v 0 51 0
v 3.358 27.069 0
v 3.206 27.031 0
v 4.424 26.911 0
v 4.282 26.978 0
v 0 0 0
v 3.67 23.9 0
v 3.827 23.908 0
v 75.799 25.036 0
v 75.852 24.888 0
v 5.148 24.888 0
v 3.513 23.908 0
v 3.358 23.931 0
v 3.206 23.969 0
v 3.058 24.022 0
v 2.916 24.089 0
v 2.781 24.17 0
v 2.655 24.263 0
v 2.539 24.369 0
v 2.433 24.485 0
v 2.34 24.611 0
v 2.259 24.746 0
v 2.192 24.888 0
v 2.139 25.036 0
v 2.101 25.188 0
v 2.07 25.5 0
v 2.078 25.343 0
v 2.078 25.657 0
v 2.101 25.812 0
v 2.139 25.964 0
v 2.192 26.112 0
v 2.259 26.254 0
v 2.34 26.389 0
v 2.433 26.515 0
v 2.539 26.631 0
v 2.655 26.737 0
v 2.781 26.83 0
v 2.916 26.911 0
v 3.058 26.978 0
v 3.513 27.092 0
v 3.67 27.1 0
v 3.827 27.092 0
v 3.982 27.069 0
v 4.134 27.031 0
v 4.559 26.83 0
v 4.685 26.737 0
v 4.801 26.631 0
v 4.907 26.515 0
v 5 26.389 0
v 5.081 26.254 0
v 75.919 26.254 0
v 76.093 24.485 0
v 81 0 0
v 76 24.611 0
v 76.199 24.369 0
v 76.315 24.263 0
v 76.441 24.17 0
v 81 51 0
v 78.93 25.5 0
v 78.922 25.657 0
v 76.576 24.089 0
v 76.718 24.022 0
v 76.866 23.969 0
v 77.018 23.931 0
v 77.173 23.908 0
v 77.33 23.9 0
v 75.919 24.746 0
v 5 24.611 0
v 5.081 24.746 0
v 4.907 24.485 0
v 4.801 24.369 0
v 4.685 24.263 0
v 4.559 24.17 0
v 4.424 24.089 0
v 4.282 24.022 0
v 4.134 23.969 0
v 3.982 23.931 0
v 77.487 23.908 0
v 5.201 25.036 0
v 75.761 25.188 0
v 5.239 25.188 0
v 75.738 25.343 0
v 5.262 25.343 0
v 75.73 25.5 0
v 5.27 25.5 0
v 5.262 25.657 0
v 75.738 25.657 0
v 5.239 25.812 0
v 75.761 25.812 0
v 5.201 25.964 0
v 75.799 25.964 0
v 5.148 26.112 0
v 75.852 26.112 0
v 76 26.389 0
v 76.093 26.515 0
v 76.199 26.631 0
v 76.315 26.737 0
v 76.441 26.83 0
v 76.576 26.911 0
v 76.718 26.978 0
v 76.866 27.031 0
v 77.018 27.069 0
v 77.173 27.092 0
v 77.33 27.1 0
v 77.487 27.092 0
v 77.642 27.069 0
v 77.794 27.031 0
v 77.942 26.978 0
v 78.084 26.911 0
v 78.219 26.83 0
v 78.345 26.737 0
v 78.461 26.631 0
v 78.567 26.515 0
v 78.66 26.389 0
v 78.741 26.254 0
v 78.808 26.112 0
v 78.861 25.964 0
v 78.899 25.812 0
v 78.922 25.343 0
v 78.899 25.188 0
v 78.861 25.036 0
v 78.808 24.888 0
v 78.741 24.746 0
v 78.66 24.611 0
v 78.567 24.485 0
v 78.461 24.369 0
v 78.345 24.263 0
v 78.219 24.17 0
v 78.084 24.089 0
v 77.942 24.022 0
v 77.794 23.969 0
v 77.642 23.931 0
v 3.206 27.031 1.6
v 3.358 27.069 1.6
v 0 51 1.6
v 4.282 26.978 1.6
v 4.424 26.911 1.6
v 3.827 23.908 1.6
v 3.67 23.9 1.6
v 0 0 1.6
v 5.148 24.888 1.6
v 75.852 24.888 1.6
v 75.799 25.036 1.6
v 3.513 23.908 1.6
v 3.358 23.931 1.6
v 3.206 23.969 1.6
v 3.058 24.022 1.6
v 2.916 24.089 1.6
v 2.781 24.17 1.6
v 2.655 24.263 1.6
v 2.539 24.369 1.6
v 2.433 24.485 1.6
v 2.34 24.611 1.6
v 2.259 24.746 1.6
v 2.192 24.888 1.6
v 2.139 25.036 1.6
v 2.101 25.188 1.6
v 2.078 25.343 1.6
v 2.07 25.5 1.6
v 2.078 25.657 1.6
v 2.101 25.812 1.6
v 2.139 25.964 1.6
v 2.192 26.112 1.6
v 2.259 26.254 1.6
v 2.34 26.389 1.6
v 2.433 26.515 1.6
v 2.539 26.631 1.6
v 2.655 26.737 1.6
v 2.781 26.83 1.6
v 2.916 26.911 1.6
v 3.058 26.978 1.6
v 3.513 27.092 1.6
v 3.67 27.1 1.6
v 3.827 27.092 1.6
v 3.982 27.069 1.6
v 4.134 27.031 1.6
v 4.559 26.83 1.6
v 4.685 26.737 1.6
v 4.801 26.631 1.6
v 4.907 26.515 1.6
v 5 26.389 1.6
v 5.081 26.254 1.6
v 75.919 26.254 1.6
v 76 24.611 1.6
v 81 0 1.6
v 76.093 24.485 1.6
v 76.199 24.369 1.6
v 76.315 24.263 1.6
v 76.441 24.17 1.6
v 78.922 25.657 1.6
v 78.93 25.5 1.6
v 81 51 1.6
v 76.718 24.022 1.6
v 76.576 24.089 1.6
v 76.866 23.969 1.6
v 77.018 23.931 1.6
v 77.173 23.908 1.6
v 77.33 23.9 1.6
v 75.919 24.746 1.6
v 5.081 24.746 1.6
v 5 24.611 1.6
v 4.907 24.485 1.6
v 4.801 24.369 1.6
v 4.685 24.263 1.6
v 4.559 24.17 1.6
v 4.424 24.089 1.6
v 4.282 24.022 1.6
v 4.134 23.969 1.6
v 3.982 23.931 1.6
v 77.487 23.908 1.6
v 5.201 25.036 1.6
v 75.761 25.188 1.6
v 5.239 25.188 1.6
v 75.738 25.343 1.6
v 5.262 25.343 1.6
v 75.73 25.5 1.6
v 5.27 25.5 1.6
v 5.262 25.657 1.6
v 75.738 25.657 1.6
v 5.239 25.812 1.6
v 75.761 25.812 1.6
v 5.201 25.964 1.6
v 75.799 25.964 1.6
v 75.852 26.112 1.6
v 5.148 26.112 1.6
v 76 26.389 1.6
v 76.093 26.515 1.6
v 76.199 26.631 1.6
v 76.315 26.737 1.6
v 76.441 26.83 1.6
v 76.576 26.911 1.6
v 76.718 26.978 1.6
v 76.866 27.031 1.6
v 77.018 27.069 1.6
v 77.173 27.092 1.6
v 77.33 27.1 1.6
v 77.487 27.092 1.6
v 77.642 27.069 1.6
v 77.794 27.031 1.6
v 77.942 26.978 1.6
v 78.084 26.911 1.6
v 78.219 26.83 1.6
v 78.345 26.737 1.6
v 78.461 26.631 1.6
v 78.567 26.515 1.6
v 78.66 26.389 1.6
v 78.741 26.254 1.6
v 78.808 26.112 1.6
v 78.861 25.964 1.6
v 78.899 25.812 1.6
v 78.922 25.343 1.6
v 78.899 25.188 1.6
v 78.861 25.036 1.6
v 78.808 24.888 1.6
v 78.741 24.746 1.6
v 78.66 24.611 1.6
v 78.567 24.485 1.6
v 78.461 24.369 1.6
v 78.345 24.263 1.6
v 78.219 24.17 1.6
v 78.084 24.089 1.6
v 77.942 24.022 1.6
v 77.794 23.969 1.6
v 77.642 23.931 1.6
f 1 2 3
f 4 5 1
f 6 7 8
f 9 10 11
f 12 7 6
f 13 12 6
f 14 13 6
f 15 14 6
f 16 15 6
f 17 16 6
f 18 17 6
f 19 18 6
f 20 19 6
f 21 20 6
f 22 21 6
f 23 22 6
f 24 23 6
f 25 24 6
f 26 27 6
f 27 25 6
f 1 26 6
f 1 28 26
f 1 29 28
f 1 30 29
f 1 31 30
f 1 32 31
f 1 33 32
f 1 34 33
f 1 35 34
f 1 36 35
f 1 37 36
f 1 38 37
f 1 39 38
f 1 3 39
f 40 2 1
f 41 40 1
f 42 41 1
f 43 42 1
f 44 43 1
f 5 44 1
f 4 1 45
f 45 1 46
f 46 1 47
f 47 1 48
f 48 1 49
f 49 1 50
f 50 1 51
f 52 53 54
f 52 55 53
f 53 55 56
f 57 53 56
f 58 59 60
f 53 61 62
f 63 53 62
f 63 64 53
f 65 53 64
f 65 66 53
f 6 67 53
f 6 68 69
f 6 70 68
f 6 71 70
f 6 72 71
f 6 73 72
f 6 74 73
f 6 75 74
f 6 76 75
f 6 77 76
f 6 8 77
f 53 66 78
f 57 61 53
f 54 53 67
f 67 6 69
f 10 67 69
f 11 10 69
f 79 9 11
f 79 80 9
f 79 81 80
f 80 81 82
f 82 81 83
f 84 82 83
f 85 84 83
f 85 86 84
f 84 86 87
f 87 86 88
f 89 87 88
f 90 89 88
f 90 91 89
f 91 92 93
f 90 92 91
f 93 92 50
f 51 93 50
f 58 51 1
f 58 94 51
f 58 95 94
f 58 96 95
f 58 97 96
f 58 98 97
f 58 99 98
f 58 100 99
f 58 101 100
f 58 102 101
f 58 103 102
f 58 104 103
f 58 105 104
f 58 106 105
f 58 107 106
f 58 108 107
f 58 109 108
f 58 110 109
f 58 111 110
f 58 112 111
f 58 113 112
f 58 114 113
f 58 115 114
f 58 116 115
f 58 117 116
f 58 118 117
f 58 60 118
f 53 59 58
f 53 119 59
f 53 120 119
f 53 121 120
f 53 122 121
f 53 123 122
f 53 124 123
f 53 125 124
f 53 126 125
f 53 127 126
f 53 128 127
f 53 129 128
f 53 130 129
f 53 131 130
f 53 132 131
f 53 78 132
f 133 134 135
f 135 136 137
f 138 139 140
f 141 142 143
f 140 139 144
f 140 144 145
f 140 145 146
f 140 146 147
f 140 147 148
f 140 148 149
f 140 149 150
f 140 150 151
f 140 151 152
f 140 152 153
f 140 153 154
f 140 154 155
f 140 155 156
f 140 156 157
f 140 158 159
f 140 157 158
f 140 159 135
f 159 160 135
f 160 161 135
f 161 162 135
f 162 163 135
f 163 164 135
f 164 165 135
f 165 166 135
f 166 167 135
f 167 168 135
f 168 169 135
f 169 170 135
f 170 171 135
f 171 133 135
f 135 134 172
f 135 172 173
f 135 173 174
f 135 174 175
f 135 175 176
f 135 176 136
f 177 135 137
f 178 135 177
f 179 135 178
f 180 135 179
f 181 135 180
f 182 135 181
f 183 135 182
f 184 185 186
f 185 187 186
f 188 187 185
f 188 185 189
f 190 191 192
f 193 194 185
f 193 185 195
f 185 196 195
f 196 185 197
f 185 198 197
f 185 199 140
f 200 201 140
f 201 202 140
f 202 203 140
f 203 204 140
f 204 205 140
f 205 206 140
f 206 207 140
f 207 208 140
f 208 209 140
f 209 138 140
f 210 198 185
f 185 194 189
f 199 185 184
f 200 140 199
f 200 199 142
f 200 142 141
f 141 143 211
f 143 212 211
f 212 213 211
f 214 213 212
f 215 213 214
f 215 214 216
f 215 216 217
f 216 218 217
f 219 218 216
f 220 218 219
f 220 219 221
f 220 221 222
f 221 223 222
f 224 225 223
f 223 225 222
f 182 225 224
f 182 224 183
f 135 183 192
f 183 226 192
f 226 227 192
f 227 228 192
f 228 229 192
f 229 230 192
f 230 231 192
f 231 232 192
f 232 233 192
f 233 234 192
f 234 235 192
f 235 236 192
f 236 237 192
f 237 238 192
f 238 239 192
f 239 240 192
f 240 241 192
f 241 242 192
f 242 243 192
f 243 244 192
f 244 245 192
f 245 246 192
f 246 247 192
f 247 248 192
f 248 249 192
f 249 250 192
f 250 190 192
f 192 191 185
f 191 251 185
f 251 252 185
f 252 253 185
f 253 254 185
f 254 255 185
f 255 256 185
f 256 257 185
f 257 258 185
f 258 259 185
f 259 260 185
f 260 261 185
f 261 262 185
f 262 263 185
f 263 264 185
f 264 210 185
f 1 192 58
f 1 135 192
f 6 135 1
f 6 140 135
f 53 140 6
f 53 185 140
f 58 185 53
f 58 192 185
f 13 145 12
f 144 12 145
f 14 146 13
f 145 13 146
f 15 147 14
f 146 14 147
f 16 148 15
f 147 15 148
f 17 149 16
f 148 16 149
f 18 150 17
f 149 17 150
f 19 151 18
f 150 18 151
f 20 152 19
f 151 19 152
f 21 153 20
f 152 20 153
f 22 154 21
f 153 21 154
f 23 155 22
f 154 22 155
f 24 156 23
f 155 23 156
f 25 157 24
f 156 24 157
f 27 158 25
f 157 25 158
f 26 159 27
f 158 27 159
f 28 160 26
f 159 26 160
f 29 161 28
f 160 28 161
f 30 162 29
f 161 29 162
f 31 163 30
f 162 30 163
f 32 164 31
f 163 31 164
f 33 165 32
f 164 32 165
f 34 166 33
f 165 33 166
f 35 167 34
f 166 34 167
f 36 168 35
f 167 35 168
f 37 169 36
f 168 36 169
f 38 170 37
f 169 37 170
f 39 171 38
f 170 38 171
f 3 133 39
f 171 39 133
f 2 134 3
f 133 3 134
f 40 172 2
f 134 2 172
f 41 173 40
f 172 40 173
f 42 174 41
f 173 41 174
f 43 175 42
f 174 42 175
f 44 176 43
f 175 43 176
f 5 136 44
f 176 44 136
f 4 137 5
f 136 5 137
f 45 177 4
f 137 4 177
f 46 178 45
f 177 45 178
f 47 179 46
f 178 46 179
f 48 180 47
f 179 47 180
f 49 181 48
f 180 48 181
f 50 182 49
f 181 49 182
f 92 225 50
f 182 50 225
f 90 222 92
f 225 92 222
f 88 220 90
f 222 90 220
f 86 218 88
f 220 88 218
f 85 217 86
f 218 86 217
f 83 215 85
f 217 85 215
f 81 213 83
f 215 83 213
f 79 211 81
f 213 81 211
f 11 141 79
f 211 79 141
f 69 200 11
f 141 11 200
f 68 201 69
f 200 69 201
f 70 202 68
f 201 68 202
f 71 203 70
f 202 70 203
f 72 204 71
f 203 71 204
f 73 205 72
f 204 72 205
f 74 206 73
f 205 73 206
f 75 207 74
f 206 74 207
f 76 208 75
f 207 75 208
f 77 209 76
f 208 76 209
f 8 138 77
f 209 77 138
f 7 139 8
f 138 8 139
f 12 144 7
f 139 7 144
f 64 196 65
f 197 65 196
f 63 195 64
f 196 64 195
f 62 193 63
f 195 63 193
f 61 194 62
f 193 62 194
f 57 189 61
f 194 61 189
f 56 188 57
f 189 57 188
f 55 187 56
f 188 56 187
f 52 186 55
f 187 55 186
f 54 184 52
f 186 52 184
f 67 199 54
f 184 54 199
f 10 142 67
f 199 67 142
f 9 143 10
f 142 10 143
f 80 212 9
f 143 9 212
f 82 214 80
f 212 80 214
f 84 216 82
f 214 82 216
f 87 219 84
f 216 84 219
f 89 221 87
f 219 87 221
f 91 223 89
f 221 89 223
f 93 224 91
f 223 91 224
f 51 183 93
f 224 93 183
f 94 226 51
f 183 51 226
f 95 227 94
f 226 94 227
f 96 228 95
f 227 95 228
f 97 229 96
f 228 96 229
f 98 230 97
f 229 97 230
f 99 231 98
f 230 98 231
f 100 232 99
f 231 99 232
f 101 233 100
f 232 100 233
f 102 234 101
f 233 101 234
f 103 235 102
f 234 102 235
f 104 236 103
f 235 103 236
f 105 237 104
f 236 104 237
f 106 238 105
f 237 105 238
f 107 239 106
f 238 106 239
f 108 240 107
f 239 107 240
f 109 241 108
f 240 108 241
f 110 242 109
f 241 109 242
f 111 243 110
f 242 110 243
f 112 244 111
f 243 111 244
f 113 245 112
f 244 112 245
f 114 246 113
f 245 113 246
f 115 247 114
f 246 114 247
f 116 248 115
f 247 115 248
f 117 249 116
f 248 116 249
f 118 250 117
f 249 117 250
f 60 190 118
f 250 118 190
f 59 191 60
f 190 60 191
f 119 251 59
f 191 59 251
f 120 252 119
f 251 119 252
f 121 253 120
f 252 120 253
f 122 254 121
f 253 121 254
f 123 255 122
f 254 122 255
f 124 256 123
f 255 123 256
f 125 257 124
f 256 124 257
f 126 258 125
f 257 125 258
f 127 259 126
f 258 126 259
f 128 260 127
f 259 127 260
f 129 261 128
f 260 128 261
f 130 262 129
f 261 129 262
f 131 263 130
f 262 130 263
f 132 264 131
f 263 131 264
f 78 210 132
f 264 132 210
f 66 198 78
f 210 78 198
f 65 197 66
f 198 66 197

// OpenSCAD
/**
 * Adafruit Prototyping Board (571 holes)
 * https://www.adafruit.com/product/571
 */

// pcb
ada_pcb571_width = 81;
ada_pcb571_length = 51;
ada_pcb571_height = 1.6;

// mount holes
ada_pcb571_mount_radius = 3.2 / 2;
ada_pcb571_mount_width = 73.66;
ada_pcb571_mount_length = 0;

// parts
ada_pcb571_parts_height = 25;

// clearance dimensions
ada_pcb571_total_height = ada_pcb571_height + ada_pcb571_parts_height;

/**
 * Mount Holes
 */
module ada_pcb571_mount_holes() {
    offset_width = 0.5 * (ada_pcb571_width - ada_pcb571_mount_width);
    offset_length = 0.5 * (ada_pcb571_length - ada_pcb571_mount_length);

    translate([
        offset_width,
        offset_length
    ])
    circle(ada_pcb571_mount_radius);

    translate([
        ada_pcb571_width - offset_width,
        offset_length
    ])
    circle(ada_pcb571_mount_radius);
}

/**
 * PCB
 */
module ada_pcb571(include_pins=$preview, show_parts=$preview) {
    // board
    color([0.8, 0.6, 0.45])
    linear_extrude(ada_pcb571_height) {
        difference() {
            // board
            square([ada_pcb571_width, ada_pcb571_length]);
            
            // mount holes
            ada_pcb571_mount_holes();
        }
    }
    
    // mounting pins
    if (include_pins) {
        ada_pcb571_mount_pins();
    }
    
    // clearance region for mounted parts
    if (show_parts) {
        color("gray", 0.25)
        translate([0, 0, ada_pcb571_height + 0.1])
        cube([
            ada_pcb571_width,
            ada_pcb571_length,
            ada_pcb571_parts_height - 0.1
        ]);
    }
}

/**
 * Mount Pins
 */
module ada_pcb571_mount_pins() {
    color("grey")
    linear_extrude(2.4 * ada_pcb571_height) {
        offset(r=-0.4) {
            ada_pcb571_mount_holes();
        }
    }
}

/**
 * Preview
 */
ada_pcb571_preview = true;
if (ada_pcb571_preview) {
    $fn = 64;
    ada_pcb571();
}
